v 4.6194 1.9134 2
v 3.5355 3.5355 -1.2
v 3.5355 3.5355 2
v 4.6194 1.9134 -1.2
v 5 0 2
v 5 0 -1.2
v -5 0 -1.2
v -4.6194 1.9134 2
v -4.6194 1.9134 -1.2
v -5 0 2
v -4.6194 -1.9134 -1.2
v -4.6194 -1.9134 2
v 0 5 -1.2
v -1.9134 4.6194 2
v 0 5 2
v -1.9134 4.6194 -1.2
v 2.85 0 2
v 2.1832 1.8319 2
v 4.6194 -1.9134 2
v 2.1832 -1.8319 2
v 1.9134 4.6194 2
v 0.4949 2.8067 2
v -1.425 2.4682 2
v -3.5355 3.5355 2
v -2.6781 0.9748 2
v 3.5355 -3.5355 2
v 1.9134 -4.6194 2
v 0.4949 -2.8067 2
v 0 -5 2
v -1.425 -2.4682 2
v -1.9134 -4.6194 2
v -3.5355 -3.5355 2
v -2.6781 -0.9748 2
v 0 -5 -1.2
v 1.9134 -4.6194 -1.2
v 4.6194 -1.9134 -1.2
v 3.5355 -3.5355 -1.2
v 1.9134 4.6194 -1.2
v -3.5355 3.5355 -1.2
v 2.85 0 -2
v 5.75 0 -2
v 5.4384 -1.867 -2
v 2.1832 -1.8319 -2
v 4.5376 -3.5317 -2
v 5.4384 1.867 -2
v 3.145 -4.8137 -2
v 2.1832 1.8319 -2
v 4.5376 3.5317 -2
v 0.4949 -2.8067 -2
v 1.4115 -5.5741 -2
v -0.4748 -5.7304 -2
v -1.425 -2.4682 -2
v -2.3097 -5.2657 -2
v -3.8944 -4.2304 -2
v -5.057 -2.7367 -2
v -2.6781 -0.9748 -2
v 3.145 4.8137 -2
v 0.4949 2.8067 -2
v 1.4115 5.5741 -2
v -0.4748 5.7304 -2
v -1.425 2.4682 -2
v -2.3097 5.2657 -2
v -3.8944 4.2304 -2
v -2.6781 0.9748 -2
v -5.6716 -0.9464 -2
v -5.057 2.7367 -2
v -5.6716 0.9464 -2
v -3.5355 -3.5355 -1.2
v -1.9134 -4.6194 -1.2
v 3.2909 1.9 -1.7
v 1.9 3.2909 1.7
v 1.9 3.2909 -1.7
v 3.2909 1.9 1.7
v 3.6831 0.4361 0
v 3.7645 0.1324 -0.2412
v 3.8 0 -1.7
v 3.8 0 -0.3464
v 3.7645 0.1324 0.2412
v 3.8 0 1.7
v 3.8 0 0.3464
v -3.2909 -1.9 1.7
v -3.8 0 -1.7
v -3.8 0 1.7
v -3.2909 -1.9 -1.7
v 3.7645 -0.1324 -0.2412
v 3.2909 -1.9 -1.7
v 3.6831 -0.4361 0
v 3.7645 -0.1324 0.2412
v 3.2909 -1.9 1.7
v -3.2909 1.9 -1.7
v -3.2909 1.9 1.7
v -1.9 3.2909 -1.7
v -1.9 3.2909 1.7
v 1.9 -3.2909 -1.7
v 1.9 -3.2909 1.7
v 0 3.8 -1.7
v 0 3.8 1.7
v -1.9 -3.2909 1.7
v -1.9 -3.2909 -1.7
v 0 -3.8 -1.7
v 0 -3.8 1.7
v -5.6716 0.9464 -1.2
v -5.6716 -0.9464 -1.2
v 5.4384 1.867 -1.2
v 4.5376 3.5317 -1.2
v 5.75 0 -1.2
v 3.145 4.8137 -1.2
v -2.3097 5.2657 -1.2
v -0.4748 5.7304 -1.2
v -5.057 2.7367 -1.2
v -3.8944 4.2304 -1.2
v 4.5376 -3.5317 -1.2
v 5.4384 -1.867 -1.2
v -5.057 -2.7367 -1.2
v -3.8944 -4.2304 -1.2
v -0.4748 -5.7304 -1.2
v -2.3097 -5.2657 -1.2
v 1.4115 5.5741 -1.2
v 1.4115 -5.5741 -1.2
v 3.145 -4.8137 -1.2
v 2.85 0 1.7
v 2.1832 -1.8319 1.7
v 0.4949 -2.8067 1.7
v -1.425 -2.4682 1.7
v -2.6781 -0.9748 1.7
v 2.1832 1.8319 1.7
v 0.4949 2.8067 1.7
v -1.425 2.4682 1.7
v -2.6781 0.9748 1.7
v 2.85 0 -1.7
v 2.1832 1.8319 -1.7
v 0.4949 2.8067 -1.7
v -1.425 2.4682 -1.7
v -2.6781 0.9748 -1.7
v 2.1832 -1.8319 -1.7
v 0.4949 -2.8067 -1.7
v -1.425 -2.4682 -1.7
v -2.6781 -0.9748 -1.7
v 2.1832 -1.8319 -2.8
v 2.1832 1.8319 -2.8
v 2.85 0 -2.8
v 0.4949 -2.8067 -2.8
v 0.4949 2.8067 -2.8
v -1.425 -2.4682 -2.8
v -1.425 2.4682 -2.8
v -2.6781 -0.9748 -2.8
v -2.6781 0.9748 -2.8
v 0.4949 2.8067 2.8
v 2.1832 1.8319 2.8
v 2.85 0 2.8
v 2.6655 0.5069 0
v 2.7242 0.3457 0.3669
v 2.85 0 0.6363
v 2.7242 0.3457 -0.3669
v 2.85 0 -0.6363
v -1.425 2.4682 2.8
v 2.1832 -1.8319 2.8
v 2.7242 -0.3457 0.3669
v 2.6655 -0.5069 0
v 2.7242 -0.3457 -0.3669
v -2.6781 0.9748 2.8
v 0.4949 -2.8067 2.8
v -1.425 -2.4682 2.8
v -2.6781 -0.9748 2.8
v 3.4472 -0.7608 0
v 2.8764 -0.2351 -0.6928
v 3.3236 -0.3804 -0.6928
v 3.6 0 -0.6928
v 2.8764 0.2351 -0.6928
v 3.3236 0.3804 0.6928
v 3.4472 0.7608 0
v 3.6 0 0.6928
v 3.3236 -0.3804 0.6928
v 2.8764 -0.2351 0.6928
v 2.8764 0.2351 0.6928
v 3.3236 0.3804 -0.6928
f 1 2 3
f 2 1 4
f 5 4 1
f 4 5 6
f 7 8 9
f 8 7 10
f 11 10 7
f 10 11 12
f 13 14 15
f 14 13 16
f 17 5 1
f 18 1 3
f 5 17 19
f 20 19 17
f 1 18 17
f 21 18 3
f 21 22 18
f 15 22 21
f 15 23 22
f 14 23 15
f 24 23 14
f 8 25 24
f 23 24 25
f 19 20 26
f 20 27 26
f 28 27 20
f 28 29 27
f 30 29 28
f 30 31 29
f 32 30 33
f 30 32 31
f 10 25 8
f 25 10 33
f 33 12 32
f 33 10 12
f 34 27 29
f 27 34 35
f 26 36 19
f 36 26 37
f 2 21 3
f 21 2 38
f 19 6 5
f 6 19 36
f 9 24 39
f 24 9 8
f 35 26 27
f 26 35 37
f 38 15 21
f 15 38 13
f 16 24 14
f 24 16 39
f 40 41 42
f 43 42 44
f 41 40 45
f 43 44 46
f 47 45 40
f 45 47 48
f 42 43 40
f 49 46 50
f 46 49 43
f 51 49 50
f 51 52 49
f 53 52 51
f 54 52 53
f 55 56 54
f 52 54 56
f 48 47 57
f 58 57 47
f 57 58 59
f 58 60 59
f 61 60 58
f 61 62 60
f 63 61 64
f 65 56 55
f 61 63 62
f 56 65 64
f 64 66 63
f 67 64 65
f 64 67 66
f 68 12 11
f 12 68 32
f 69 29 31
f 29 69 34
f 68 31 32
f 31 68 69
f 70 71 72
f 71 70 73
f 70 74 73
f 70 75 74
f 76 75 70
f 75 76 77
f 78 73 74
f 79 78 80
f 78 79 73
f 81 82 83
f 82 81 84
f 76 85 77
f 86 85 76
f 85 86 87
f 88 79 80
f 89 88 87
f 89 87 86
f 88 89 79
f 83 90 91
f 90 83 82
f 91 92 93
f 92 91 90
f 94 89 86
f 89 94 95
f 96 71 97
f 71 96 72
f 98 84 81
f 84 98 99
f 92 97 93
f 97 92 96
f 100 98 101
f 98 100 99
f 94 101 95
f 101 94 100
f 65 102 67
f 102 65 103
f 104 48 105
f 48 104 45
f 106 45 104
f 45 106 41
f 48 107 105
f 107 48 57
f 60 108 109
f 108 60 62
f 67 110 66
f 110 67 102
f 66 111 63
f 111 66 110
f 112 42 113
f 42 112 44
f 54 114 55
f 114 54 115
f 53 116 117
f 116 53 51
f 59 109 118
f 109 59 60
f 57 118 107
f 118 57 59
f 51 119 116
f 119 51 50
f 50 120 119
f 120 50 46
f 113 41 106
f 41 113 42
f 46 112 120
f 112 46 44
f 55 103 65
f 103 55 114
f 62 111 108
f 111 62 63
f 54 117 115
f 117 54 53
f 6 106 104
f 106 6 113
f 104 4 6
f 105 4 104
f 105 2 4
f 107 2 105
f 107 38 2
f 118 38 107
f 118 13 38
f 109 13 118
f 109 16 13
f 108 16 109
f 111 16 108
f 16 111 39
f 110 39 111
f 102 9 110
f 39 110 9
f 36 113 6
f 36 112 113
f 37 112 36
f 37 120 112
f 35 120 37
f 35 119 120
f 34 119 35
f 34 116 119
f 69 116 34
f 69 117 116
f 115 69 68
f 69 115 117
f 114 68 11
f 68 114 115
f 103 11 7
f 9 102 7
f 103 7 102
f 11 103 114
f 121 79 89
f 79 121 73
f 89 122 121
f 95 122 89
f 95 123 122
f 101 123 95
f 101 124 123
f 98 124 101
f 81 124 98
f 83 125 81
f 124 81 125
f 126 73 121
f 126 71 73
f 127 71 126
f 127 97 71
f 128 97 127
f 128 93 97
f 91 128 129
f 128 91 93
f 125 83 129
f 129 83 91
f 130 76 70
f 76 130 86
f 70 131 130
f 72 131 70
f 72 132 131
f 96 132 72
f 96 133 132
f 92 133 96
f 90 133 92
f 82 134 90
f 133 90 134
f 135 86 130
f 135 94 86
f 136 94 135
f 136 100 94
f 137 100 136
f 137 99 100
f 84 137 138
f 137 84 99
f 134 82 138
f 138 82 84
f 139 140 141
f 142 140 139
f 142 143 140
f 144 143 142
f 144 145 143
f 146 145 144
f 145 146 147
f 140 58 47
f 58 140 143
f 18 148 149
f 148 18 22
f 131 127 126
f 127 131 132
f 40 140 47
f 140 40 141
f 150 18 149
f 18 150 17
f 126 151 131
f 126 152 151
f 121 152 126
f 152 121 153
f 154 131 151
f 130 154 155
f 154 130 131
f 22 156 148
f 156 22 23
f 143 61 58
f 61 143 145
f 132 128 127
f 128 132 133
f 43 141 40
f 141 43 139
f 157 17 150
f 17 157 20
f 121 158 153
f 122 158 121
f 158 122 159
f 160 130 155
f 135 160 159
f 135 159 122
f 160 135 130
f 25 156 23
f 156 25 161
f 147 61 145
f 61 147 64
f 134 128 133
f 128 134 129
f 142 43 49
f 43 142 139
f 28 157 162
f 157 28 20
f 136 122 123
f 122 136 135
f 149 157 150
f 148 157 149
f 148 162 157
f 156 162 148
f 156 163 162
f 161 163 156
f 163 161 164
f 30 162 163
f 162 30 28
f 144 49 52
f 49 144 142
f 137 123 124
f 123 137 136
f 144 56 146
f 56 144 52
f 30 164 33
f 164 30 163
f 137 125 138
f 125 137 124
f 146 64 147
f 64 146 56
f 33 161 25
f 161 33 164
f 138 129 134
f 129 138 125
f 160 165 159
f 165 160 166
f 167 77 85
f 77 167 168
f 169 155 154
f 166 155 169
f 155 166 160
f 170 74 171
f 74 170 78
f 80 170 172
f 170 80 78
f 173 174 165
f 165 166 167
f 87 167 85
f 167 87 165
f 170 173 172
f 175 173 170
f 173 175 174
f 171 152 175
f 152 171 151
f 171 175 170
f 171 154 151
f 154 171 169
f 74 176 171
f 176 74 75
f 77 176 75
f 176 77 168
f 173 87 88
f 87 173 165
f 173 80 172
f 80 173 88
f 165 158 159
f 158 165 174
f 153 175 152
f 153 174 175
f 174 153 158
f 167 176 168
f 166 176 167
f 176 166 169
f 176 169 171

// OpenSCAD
// Parameters
bore_diameter_mm = 3; //[1.5:6:0.1]
outer_diameter_mm = 10; //[5:20:0.1]
width_mm = 4; //[2:8:0.1]
flange_diameter_mm = 11.5; //[6:23:0.1]
flange_width_mm = 0.8; //[0.4:1.6:0.05]
rim_thickness_mm = 1.2; //[0.6:2.4:0.05]
hub_thickness_mm = 1; //[0.5:2:0.05]
chamfer_mm = 0.3; //[0.1:0.8:0.05]
shield_thickness_mm = 0.3; //[0.15:0.8:0.05]
shield_radial_overlap_mm = 0.6; //[0.2:1.5:0.05]
raceway_clearance_mm = 0.35; //[0.15:0.8:0.05]
ball_diameter_mm = 1.6; //[0.8:3.2:0.05]
ball_radial_position_mm = 3.2; //[2:5:0.05]
overlap_mm = 0.8; //[0.5:2:0.1]

// Ball Bearing - complete geometry
module ball_bearing() {
  color("Silver") {
    // Outer Ring
    difference() {
      cylinder(r=outer_diameter_mm/2, h=width_mm, center=true);
      cylinder(r=outer_diameter_mm/2 - rim_thickness_mm, h=width_mm + 2*overlap_mm, center=true);
    }
    
    // Inner Ring
    difference() {
      cylinder(r=bore_diameter_mm/2 + hub_thickness_mm, h=width_mm, center=true);
      cylinder(r=bore_diameter_mm/2, h=width_mm + 2*overlap_mm, center=true);
    }
    
    // Flange
    difference() {
      translate([0, 0, -width_mm/2 + flange_width_mm/2])
        cylinder(r=flange_diameter_mm/2, h=flange_width_mm, center=true);
      translate([0, 0, -width_mm/2 + flange_width_mm/2])
        cylinder(r=outer_diameter_mm/2 - rim_thickness_mm, h=flange_width_mm + 2*overlap_mm, center=true);
    }
    
    // Shields
    union() {
      translate([0, 0, width_mm/2 - shield_thickness_mm/2])
        cylinder(r=outer_diameter_mm/2 - rim_thickness_mm + shield_radial_overlap_mm, h=shield_thickness_mm, center=true);
      translate([0, 0, -width_mm/2 + shield_thickness_mm/2])
        cylinder(r=outer_diameter_mm/2 - rim_thickness_mm + shield_radial_overlap_mm, h=shield_thickness_mm, center=true);
    }
    
    // Chamfers
    difference() {
      // Outer Ring Chamfers
      translate([0, 0, width_mm/2 - chamfer_mm/2])
        cylinder(r1=outer_diameter_mm/2, r2=outer_diameter_mm/2 - chamfer_mm, h=chamfer_mm, center=true);
      translate([0, 0, -width_mm/2 + chamfer_mm/2])
        cylinder(r1=outer_diameter_mm/2, r2=outer_diameter_mm/2 - chamfer_mm, h=chamfer_mm, center=true);
      
      // Inner Ring Chamfers
      translate([0, 0, width_mm/2 - chamfer_mm/2])
        cylinder(r1=bore_diameter_mm/2 + hub_thickness_mm, r2=bore_diameter_mm/2 + hub_thickness_mm - chamfer_mm, h=chamfer_mm, center=true);
      translate([0, 0, -width_mm/2 + chamfer_mm/2])
        cylinder(r1=bore_diameter_mm/2 + hub_thickness_mm, r2=bore_diameter_mm/2 + hub_thickness_mm - chamfer_mm, h=chamfer_mm, center=true);
    }
    
    // Raceway Clearance
    difference() {
      cylinder(r=bore_diameter_mm/2 + hub_thickness_mm + raceway_clearance_mm, h=width_mm + 2*overlap_mm, center=true);
    }
  }
}

// Bearing Ball - complete geometry
module bearing_ball() {
  color("SteelBlue") {
    translate([ball_radial_position_mm, 0, 0])
      sphere(r=ball_diameter_mm/2, center=true);
  }
}

// Assembly
module assembly() {
  ball_bearing();
  bearing_ball();
}

assembly();
